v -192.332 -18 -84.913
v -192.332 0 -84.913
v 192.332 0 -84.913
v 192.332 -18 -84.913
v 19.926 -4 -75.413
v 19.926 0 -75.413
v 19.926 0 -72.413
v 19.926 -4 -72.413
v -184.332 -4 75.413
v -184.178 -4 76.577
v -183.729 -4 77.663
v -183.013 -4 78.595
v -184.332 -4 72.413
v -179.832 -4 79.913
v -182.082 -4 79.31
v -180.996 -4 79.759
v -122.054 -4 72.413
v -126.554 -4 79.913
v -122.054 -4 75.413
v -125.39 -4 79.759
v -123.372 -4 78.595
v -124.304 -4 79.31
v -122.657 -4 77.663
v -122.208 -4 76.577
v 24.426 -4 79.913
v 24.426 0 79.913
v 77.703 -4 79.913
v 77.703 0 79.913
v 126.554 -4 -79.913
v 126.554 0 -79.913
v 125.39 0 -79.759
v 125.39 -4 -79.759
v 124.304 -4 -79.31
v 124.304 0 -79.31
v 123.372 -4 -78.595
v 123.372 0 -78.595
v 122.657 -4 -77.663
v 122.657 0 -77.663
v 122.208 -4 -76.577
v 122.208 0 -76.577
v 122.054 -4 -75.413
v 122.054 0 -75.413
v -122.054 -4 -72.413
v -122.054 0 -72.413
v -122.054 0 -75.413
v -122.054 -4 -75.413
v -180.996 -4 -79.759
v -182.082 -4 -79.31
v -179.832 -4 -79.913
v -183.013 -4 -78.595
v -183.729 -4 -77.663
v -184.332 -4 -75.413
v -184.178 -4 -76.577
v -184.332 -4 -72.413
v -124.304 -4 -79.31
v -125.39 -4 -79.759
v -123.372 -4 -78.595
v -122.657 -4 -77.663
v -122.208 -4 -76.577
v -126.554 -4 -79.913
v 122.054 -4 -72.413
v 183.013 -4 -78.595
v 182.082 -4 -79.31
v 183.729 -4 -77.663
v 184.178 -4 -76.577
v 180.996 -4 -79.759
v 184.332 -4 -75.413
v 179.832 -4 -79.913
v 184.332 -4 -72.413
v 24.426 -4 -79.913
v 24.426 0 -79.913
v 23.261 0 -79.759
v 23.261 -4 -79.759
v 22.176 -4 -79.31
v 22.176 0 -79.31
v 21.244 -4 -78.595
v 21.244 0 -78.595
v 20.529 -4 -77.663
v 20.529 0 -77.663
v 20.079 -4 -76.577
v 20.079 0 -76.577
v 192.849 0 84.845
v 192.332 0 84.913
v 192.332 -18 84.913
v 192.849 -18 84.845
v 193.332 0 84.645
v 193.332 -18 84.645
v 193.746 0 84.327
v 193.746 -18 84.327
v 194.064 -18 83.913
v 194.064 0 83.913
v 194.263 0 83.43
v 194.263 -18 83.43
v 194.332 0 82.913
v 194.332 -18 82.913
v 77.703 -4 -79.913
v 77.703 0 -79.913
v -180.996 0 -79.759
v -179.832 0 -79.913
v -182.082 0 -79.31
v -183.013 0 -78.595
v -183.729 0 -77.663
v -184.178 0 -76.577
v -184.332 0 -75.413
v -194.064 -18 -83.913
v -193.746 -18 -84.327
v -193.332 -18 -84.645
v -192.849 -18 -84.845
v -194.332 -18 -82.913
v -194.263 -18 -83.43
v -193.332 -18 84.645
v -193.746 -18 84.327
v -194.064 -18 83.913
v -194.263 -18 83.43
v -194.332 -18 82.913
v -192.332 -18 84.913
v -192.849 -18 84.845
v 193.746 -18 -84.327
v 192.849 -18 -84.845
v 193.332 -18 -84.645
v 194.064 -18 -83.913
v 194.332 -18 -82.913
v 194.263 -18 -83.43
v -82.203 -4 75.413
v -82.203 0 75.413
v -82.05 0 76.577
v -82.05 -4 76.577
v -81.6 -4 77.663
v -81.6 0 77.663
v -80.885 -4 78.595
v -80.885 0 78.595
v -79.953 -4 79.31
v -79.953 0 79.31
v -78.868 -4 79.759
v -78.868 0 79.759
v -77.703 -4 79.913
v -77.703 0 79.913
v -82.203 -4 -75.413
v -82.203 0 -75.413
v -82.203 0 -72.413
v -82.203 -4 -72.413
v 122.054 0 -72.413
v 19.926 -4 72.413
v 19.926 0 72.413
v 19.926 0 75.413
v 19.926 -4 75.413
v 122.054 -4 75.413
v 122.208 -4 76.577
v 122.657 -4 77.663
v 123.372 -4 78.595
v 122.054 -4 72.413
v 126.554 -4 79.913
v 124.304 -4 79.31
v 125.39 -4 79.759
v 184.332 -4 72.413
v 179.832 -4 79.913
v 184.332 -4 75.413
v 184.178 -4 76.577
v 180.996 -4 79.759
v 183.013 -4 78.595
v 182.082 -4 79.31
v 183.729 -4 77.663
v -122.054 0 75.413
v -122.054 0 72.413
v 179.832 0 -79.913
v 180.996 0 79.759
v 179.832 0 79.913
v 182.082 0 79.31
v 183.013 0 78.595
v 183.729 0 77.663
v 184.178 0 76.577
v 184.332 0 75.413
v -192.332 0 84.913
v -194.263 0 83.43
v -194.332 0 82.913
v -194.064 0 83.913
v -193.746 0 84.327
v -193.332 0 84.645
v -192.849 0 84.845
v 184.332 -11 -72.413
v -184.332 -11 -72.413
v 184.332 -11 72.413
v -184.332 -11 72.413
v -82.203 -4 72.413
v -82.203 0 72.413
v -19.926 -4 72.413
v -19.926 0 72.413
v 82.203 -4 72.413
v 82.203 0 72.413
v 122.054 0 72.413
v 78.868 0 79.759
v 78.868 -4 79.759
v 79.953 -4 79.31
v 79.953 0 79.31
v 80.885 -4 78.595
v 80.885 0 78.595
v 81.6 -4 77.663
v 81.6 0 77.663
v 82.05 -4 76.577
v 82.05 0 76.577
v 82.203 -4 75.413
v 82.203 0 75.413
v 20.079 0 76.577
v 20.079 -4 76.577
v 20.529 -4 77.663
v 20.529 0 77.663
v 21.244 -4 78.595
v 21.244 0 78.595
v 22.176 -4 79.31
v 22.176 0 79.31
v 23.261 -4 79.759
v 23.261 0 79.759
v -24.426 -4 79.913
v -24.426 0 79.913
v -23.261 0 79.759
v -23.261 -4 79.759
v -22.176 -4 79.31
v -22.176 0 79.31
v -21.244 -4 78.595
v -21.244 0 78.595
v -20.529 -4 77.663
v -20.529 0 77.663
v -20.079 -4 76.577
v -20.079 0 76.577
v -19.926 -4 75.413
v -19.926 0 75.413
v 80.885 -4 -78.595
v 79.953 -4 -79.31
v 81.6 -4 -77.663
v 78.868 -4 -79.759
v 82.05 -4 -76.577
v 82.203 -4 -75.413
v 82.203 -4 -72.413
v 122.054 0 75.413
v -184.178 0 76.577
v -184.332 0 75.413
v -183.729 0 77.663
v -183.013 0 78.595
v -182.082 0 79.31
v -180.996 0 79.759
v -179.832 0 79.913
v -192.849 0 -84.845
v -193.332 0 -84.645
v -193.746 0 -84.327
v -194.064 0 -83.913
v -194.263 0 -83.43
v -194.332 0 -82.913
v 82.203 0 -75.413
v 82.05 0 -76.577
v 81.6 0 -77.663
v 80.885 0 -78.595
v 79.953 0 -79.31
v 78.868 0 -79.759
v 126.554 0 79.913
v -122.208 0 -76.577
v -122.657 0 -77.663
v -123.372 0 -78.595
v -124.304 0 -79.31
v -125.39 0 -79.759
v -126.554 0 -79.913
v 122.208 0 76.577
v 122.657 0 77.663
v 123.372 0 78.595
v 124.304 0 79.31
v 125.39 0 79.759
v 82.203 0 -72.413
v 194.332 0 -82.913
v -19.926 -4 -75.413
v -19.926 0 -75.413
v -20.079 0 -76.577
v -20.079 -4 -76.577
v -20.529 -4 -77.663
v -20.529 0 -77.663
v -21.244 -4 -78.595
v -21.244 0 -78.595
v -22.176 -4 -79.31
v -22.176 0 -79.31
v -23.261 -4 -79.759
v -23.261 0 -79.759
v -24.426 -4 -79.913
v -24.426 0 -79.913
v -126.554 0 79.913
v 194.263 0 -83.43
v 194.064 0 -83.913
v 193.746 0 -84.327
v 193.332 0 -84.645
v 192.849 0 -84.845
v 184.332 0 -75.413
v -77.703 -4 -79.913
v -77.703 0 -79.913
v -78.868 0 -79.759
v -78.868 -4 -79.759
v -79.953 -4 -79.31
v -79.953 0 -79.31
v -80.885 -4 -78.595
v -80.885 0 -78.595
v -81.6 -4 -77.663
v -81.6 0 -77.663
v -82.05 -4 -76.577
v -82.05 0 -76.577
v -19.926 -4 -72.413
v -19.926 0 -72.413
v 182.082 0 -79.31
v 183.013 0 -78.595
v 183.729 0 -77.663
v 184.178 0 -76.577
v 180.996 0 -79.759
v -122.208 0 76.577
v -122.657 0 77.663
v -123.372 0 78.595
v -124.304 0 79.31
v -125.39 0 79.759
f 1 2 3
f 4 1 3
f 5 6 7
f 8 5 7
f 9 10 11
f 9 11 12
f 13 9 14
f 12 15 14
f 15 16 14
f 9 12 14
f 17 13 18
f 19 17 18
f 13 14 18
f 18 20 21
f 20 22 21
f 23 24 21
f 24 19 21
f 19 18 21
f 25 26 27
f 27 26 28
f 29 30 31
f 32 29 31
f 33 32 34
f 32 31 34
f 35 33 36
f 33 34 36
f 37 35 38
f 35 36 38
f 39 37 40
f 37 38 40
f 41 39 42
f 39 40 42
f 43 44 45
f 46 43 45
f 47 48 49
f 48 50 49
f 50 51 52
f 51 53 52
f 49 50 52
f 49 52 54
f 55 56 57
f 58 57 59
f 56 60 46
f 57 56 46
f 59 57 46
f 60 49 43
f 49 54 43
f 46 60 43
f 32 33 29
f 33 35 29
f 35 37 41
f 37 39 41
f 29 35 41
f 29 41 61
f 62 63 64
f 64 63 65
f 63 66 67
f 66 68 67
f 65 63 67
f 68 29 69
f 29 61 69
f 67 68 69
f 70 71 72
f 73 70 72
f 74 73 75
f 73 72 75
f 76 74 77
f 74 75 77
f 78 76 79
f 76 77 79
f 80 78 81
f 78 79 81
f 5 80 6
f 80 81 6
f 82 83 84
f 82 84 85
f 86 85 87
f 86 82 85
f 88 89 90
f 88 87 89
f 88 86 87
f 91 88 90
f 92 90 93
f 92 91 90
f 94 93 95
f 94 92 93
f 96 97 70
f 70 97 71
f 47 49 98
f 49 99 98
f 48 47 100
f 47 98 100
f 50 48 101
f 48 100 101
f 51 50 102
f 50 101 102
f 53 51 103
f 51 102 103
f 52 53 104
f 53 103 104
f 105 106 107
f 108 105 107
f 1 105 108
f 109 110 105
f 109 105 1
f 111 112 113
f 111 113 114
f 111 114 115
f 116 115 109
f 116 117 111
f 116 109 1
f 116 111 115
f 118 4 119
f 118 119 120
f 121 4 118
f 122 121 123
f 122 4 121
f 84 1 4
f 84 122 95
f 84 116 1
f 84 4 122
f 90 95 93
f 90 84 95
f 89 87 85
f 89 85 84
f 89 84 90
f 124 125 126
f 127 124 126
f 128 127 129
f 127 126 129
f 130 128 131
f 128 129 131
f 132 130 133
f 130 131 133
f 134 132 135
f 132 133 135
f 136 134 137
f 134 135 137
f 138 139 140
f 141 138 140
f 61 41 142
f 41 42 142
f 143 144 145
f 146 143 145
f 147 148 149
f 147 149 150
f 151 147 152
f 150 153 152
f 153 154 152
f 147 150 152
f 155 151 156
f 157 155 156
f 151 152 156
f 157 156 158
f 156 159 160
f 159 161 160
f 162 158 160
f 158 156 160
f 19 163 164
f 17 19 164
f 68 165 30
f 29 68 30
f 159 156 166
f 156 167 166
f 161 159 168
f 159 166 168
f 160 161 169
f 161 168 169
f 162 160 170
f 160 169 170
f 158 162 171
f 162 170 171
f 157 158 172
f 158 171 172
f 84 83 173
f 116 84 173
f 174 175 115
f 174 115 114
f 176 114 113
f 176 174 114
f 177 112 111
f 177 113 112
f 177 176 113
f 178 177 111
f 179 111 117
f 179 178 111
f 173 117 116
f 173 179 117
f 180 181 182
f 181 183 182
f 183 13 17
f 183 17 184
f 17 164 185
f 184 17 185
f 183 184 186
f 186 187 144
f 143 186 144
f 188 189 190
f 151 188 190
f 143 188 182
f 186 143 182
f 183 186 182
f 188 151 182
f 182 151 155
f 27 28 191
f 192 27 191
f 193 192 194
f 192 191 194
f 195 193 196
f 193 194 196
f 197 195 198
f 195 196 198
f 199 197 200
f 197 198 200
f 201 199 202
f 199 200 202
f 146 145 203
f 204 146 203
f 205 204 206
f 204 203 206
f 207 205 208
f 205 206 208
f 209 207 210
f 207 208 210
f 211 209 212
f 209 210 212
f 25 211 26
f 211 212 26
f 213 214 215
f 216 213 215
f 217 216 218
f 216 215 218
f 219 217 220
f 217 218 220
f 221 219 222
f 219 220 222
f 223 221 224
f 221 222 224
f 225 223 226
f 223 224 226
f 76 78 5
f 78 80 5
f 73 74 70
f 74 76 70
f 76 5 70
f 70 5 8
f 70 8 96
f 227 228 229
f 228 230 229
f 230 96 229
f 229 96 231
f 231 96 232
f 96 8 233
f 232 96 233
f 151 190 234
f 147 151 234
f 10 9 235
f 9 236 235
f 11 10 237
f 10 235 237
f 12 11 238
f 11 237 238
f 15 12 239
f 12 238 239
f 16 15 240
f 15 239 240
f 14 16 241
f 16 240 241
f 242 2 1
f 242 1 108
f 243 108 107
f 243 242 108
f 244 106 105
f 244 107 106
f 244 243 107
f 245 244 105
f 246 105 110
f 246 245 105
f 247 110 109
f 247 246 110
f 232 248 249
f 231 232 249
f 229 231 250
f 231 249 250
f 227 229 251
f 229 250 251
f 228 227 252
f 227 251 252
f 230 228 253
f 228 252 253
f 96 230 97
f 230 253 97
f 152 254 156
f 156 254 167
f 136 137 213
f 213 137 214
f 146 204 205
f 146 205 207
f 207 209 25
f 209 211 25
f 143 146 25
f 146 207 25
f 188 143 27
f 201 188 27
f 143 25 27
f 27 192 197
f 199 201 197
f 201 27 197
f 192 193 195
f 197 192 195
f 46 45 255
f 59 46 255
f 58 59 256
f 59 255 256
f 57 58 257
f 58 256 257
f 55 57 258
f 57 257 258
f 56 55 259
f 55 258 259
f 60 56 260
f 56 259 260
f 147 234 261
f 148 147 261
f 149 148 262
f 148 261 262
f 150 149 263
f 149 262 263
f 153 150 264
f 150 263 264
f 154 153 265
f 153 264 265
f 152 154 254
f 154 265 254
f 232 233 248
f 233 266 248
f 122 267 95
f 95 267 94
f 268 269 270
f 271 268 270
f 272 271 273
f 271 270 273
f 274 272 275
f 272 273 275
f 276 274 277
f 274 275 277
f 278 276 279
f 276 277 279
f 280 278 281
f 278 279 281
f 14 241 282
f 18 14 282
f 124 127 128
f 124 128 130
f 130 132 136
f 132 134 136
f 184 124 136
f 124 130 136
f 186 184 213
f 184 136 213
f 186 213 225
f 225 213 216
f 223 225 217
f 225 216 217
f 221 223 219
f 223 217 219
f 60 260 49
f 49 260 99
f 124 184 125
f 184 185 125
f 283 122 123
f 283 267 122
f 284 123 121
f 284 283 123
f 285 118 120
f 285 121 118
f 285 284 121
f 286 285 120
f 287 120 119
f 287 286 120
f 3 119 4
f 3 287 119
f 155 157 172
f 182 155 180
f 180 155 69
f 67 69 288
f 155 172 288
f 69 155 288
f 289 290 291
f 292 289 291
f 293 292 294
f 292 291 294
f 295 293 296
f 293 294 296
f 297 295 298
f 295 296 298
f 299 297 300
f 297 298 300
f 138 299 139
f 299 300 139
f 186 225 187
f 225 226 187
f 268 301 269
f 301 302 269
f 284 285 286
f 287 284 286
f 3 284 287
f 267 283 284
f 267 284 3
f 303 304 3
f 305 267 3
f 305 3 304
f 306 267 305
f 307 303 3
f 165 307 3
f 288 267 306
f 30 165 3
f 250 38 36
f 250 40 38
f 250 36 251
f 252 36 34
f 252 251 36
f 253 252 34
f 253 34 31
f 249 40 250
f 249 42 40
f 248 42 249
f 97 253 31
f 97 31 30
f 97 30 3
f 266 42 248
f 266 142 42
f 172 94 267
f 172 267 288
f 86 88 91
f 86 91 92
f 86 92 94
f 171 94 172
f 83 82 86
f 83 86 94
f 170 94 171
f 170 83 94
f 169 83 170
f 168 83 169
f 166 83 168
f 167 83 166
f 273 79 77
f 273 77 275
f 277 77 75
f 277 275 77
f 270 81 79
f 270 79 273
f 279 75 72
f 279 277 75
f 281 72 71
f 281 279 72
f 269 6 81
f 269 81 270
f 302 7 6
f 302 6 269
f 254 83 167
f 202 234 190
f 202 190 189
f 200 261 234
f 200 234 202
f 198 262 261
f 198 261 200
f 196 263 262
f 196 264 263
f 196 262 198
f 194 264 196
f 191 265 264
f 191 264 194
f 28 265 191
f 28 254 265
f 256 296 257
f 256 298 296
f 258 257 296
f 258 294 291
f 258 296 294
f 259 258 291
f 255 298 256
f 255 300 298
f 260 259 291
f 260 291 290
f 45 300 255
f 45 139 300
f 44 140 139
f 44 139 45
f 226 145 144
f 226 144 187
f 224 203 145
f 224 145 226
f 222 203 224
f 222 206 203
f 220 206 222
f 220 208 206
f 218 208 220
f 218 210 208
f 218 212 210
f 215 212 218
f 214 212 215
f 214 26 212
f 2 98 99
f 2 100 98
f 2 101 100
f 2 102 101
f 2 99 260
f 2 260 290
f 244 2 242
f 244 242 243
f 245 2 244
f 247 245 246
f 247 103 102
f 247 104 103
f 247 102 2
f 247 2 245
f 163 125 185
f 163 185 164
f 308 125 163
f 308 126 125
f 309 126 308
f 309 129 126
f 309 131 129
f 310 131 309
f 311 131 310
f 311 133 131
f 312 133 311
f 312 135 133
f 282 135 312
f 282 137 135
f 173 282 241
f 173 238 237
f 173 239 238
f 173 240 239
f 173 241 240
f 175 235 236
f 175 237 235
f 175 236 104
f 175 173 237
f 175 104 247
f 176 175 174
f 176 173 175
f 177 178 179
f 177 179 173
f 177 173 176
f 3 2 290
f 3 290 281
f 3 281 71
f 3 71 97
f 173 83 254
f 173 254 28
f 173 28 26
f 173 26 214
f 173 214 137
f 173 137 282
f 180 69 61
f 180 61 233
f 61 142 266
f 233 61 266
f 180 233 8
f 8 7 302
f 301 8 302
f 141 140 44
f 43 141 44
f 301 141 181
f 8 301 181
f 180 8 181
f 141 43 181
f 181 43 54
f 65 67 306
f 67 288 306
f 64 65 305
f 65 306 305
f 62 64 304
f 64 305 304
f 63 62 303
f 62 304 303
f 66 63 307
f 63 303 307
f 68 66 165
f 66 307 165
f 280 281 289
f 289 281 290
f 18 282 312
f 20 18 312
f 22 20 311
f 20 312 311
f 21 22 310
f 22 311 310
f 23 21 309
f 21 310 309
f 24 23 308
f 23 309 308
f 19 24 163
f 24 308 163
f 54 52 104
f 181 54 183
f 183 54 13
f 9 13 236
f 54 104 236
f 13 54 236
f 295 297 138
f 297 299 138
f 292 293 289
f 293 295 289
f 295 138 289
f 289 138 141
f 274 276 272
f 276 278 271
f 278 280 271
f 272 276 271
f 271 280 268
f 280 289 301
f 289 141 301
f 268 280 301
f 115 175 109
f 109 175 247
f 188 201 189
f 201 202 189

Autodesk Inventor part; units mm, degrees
ref_plane "YZ Plane" through (0, 0, 0) normal (1, 0, 0) x (0, 1, 0)
ref_plane "XZ Plane" through (0, 0, 0) normal (0, 1, 0) x (-1, 0, 0)
ref_plane "XY Plane" through (0, 0, 0) normal (0, 0, 1) x (1, 0, 0)
sketch "Sketch1" plane through (0, 0, 0) normal (0, 1, 0) x (-1, 0, 0)
  line L0 (183.8315, -67.9127) -> (183.8315, 67.9127) construction
  line L1 (-179.8315, 79.4127) -> (-126.5543, 79.4127) construction
  line L2 (-122.5543, 75.4127) -> (-122.5543, 71.9127) construction
  line L3 (-81.7029, 71.9127) -> (-81.7029, 75.4127) construction
  line L4 (-77.7029, 79.4127) -> (-24.4257, 79.4127) construction
  line L5 (-20.4257, 75.4127) -> (-20.4257, 71.9127) construction
  line L6 (20.4257, 71.9127) -> (20.4257, 75.4127) construction
  line L7 (24.4257, 79.4127) -> (77.7029, 79.4127) construction
  line L8 (81.7029, 75.4127) -> (81.7029, 71.9127) construction
  line L9 (122.5543, 71.9127) -> (122.5543, 75.4127) construction
  line L10 (126.5543, 79.4127) -> (179.8315, 79.4127) construction
  line L11 (183.8315, 75.4127) -> (183.8315, 71.9127) construction
  line L12 (-126.5543, -79.4127) -> (-179.8315, -79.4127) construction
  line L13 (-183.8315, -75.4127) -> (-183.8315, -71.9127) construction
  line L14 (-122.5543, -71.9127) -> (-122.5543, -75.4127) construction
  line L15 (-81.7029, -75.4127) -> (-81.7029, -71.9127) construction
  line L16 (-24.4257, -79.4127) -> (-77.7029, -79.4127) construction
  line L17 (-20.4257, -71.9127) -> (-20.4257, -75.4127) construction
  line L18 (20.4257, -75.4127) -> (20.4257, -71.9127) construction
  line L19 (77.7029, -79.4127) -> (24.4257, -79.4127) construction
  line L20 (81.7029, -71.9127) -> (81.7029, -75.4127) construction
  line L21 (122.5543, -75.4127) -> (122.5543, -71.9127) construction
  line L22 (179.8315, -79.4127) -> (126.5543, -79.4127) construction
  line L23 (183.8315, -71.9127) -> (183.8315, -75.4127) construction
  line L24 (-122.5543, -71.9127) -> (-81.7029, -71.9127) construction
  line L25 (-20.4257, -71.9127) -> (20.4257, -71.9127) construction
  line L26 (81.7029, -71.9127) -> (122.5543, -71.9127) construction
  arc A0 (-183.8315, -75.4127) -> (-179.8315, -79.4127) centre (-179.8315, -75.4127) ccw construction
  arc A1 (-126.5543, -79.4127) -> (-122.5543, -75.4127) centre (-126.5543, -75.4127) ccw construction
  arc A2 (-81.7029, -75.4127) -> (-77.7029, -79.4127) centre (-77.7029, -75.4127) ccw construction
  arc A3 (-24.4257, -79.4127) -> (-20.4257, -75.4127) centre (-24.4257, -75.4127) ccw construction
  arc A4 (20.4257, -75.4127) -> (24.4257, -79.4127) centre (24.4257, -75.4127) ccw construction
  arc A5 (77.7029, -79.4127) -> (81.7029, -75.4127) centre (77.7029, -75.4127) ccw construction
  arc A6 (122.5543, -75.4127) -> (126.5543, -79.4127) centre (126.5543, -75.4127) ccw construction
  arc A7 (179.8315, -79.4127) -> (183.8315, -75.4127) centre (179.8315, -75.4127) ccw construction
  line L27 (183.8315, -67.9127) -> (183.8315, -71.9127) construction
  arc A8 (-179.8315, 79.4127) -> (-183.8315, 75.4127) centre (-179.8315, 75.4127) ccw construction
  arc A9 (-122.5543, 75.4127) -> (-126.5543, 79.4127) centre (-126.5543, 75.4127) ccw construction
  line L28 (-81.7029, 71.9127) -> (-122.5543, 71.9127) construction
  line L29 (20.4257, 71.9127) -> (-20.4257, 71.9127) construction
  line L30 (122.5543, 71.9127) -> (81.7029, 71.9127) construction
  line L31 (183.8315, 71.9127) -> (183.8315, 67.9127) construction
  arc A10 (-77.7029, 79.4127) -> (-81.7029, 75.4127) centre (-77.7029, 75.4127) ccw construction
  arc A11 (-20.4257, 75.4127) -> (-24.4257, 79.4127) centre (-24.4257, 75.4127) ccw construction
  arc A12 (24.4257, 79.4127) -> (20.4257, 75.4127) centre (24.4257, 75.4127) ccw construction
  arc A13 (81.7029, 75.4127) -> (77.7029, 79.4127) centre (77.7029, 75.4127) ccw construction
  arc A14 (126.5543, 79.4127) -> (122.5543, 75.4127) centre (126.5543, 75.4127) ccw construction
  arc A15 (183.8315, 75.4127) -> (179.8315, 79.4127) centre (179.8315, 75.4127) ccw construction
  line L32 (-183.8315, 75.4127) -> (-183.8315, -71.9127) construction
  line L33 (-126.5543, 79.9127) -> (-179.8315, 79.9127)
  arc A16 (-179.8315, 79.9127) -> (-184.3315, 75.4127) centre (-179.8315, 75.4127) ccw
  line L34 (-184.3315, 75.4127) -> (-184.3315, -71.9127)
  line L35 (-184.3315, -71.9127) -> (-184.3315, -75.4127)
  arc A17 (-184.3315, -75.4127) -> (-179.8315, -79.9127) centre (-179.8315, -75.4127) ccw
  line L36 (-179.8315, -79.9127) -> (-126.5543, -79.9127)
  arc A18 (-126.5543, -79.9127) -> (-122.0543, -75.4127) centre (-126.5543, -75.4127) ccw
  line L37 (-122.0543, -75.4127) -> (-122.0543, -72.4127)
  line L38 (-122.0543, -72.4127) -> (-82.2029, -72.4127)
  line L39 (-82.2029, -72.4127) -> (-82.2029, -75.4127)
  arc A19 (-82.2029, -75.4127) -> (-77.7029, -79.9127) centre (-77.7029, -75.4127) ccw
  line L40 (-77.7029, -79.9127) -> (-24.4257, -79.9127)
  arc A20 (-24.4257, -79.9127) -> (-19.9257, -75.4127) centre (-24.4257, -75.4127) ccw
  line L41 (-19.9257, -75.4127) -> (-19.9257, -72.4127)
  line L42 (-19.9257, -72.4127) -> (19.9257, -72.4127)
  line L43 (19.9257, -72.4127) -> (19.9257, -75.4127)
  arc A21 (19.9257, -75.4127) -> (24.4257, -79.9127) centre (24.4257, -75.4127) ccw
  line L44 (24.4257, -79.9127) -> (77.7029, -79.9127)
  arc A22 (77.7029, -79.9127) -> (82.2029, -75.4127) centre (77.7029, -75.4127) ccw
  line L45 (82.2029, -75.4127) -> (82.2029, -72.4127)
  line L46 (82.2029, -72.4127) -> (122.0543, -72.4127)
  line L47 (122.0543, -72.4127) -> (122.0543, -75.4127)
  arc A23 (122.0543, -75.4127) -> (126.5543, -79.9127) centre (126.5543, -75.4127) ccw
  line L48 (126.5543, -79.9127) -> (179.8315, -79.9127)
  arc A24 (179.8315, -79.9127) -> (184.3315, -75.4127) centre (179.8315, -75.4127) ccw
  line L49 (184.3315, -75.4127) -> (184.3315, -71.9127)
  line L50 (184.3315, -71.9127) -> (184.3315, -67.9127)
  line L51 (184.3315, -67.9127) -> (184.3315, 67.9127)
  line L52 (184.3315, 67.9127) -> (184.3315, 71.9127)
  line L53 (184.3315, 71.9127) -> (184.3315, 75.4127)
  arc A25 (184.3315, 75.4127) -> (179.8315, 79.9127) centre (179.8315, 75.4127) ccw
  line L54 (179.8315, 79.9127) -> (126.5543, 79.9127)
  arc A26 (126.5543, 79.9127) -> (122.0543, 75.4127) centre (126.5543, 75.4127) ccw
  line L55 (122.0543, 75.4127) -> (122.0543, 72.4127)
  line L56 (122.0543, 72.4127) -> (82.2029, 72.4127)
  line L57 (82.2029, 72.4127) -> (82.2029, 75.4127)
  arc A27 (82.2029, 75.4127) -> (77.7029, 79.9127) centre (77.7029, 75.4127) ccw
  line L58 (77.7029, 79.9127) -> (24.4257, 79.9127)
  arc A28 (24.4257, 79.9127) -> (19.9257, 75.4127) centre (24.4257, 75.4127) ccw
  line L59 (19.9257, 75.4127) -> (19.9257, 72.4127)
  line L60 (19.9257, 72.4127) -> (-19.9257, 72.4127)
  line L61 (-19.9257, 72.4127) -> (-19.9257, 75.4127)
  arc A29 (-19.9257, 75.4127) -> (-24.4257, 79.9127) centre (-24.4257, 75.4127) ccw
  line L62 (-24.4257, 79.9127) -> (-77.7029, 79.9127)
  arc A30 (-77.7029, 79.9127) -> (-82.2029, 75.4127) centre (-77.7029, 75.4127) ccw
  line L63 (-82.2029, 75.4127) -> (-82.2029, 72.4127)
  line L64 (-82.2029, 72.4127) -> (-122.0543, 72.4127)
  line L65 (-122.0543, 72.4127) -> (-122.0543, 75.4127)
  arc A31 (-122.0543, 75.4127) -> (-126.5543, 79.9127) centre (-126.5543, 75.4127) ccw
  line L66 (-179.8315, 75.4127) -> (179.8315, -75.4127) construction
  line L67 (179.8315, 75.4127) -> (-179.8315, -75.4127) construction
  line L68 (-192.3315, 84.9127) -> (192.3315, 84.9127)
  line L69 (194.3315, 82.9127) -> (194.3315, -82.9127)
  line L70 (192.3315, -84.9127) -> (-192.3315, -84.9127)
  line L71 (-194.3315, -82.9127) -> (-194.3315, 82.9127)
  line L72 (-194.3315, 84.9127) -> (194.3315, -84.9127) construction
  line L73 (194.3315, 84.9127) -> (-194.3315, -84.9127) construction
  arc A32 (-192.3315, 84.9127) -> (-194.3315, 82.9127) centre (-192.3315, 82.9127) ccw
  arc A33 (194.3315, 82.9127) -> (192.3315, 84.9127) centre (192.3315, 82.9127) ccw
  arc A34 (192.3315, -84.9127) -> (194.3315, -82.9127) centre (192.3315, -82.9127) ccw
  arc A35 (-194.3315, -82.9127) -> (-192.3315, -84.9127) centre (-192.3315, -82.9127) ccw
  point P0 (0, 0)
  point P1 (0, 0)
  dimension "d9" = 4
  dimension "d10" = 4
  dimension "d11" = 4
  dimension "d12" = 4
  dimension "d13" = 0.5
  dimension "d16" = 159.8253
  dimension "d17" = 368.6629
  dimension "d18" = 388.6629
  dimension "d19" = 169.8253
  dimension "d20" = 2
extrude "Extrusion1" add sketch "Sketch1" against normal blind 4
sketch "Sketch2" plane through (0, -4, 0) normal (0, -1, 0) x (1, 0, 0)
  line L0 (-192.3315, -84.9127) -> (192.3315, -84.9127) projected
  arc A0 (192.3315, -84.9127) -> (194.3315, -82.9127) centre (192.3315, -82.9127) ccw projected
  line L1 (194.3315, -82.9127) -> (194.3315, 82.9127) projected
  arc A1 (194.3315, 82.9127) -> (192.3315, 84.9127) centre (192.3315, 82.9127) ccw projected
  line L2 (192.3315, 84.9127) -> (-192.3315, 84.9127) projected
  arc A2 (-192.3315, 84.9127) -> (-194.3315, 82.9127) centre (-192.3315, 82.9127) ccw projected
  line L3 (-194.3315, 82.9127) -> (-194.3315, -82.9127) projected
  arc A3 (-194.3315, -82.9127) -> (-192.3315, -84.9127) centre (-192.3315, -82.9127) ccw projected
  arc A4 (126.5543, 79.9127) -> (122.0543, 75.4127) centre (126.5543, 75.4127) ccw projected
  line L4 (126.5543, 79.9127) -> (179.8315, 79.9127) projected
  arc A5 (184.3315, 75.4127) -> (179.8315, 79.9127) centre (179.8315, 75.4127) ccw projected
  line L5 (184.3315, 75.4127) -> (184.3315, -75.4127) projected
  arc A6 (179.8315, -79.9127) -> (184.3315, -75.4127) centre (179.8315, -75.4127) ccw projected
  line L6 (179.8315, -79.9127) -> (126.5543, -79.9127) projected
  arc A7 (122.0543, -75.4127) -> (126.5543, -79.9127) centre (126.5543, -75.4127) ccw projected
  line L7 (122.0543, -75.4127) -> (122.0543, -72.4127) projected
  line L8 (122.0543, -72.4127) -> (82.2029, -72.4127) projected
  line L9 (82.2029, -72.4127) -> (82.2029, -75.4127) projected
  arc A8 (77.7029, -79.9127) -> (82.2029, -75.4127) centre (77.7029, -75.4127) ccw projected
  line L10 (77.7029, -79.9127) -> (24.4257, -79.9127) projected
  arc A9 (19.9257, -75.4127) -> (24.4257, -79.9127) centre (24.4257, -75.4127) ccw projected
  line L11 (19.9257, -75.4127) -> (19.9257, -72.4127) projected
  line L12 (19.9257, -72.4127) -> (-19.9257, -72.4127) projected
  line L13 (-19.9257, -72.4127) -> (-19.9257, -75.4127) projected
  arc A10 (-24.4257, -79.9127) -> (-19.9257, -75.4127) centre (-24.4257, -75.4127) ccw projected
  line L14 (-24.4257, -79.9127) -> (-77.7029, -79.9127) projected
  arc A11 (-82.2029, -75.4127) -> (-77.7029, -79.9127) centre (-77.7029, -75.4127) ccw projected
  line L15 (-82.2029, -75.4127) -> (-82.2029, -72.4127) projected
  line L16 (-82.2029, -72.4127) -> (-122.0543, -72.4127) projected
  line L17 (-122.0543, -72.4127) -> (-122.0543, -75.4127) projected
  arc A12 (-126.5543, -79.9127) -> (-122.0543, -75.4127) centre (-126.5543, -75.4127) ccw projected
  line L18 (-126.5543, -79.9127) -> (-179.8315, -79.9127) projected
  arc A13 (-184.3315, -75.4127) -> (-179.8315, -79.9127) centre (-179.8315, -75.4127) ccw projected
  line L19 (-184.3315, -75.4127) -> (-184.3315, 75.4127) projected
  arc A14 (-179.8315, 79.9127) -> (-184.3315, 75.4127) centre (-179.8315, 75.4127) ccw projected
  line L20 (-179.8315, 79.9127) -> (-126.5543, 79.9127) projected
  arc A15 (-122.0543, 75.4127) -> (-126.5543, 79.9127) centre (-126.5543, 75.4127) ccw projected
  line L21 (-122.0543, 75.4127) -> (-122.0543, 72.4127) projected
  line L22 (-122.0543, 72.4127) -> (-82.2029, 72.4127) projected
  line L23 (-82.2029, 72.4127) -> (-82.2029, 75.4127) projected
  arc A16 (-77.7029, 79.9127) -> (-82.2029, 75.4127) centre (-77.7029, 75.4127) ccw projected
  line L24 (-77.7029, 79.9127) -> (-24.4257, 79.9127) projected
  arc A17 (-19.9257, 75.4127) -> (-24.4257, 79.9127) centre (-24.4257, 75.4127) ccw projected
  line L25 (-19.9257, 75.4127) -> (-19.9257, 72.4127) projected
  line L26 (-19.9257, 72.4127) -> (19.9257, 72.4127) projected
  line L27 (19.9257, 72.4127) -> (19.9257, 75.4127) projected
  arc A18 (24.4257, 79.9127) -> (19.9257, 75.4127) centre (24.4257, 75.4127) ccw projected
  line L28 (24.4257, 79.9127) -> (77.7029, 79.9127) projected
  arc A19 (82.2029, 75.4127) -> (77.7029, 79.9127) centre (77.7029, 75.4127) ccw projected
  line L29 (82.2029, 75.4127) -> (82.2029, 72.4127) projected
  line L30 (82.2029, 72.4127) -> (122.0543, 72.4127) projected
  line L31 (122.0543, 72.4127) -> (122.0543, 75.4127) projected
  line L32 (-184.3315, -75.4127) -> (-184.3315, 75.4127) projected
  line L33 (184.3315, 75.4127) -> (184.3315, -75.4127) projected
  line L34 (-184.3315, 72.4127) -> (184.3315, 72.4127)
  line L35 (184.3315, 72.4127) -> (184.3315, -72.4127)
  line L36 (184.3315, -72.4127) -> (-184.3315, -72.4127)
  line L37 (-184.3315, -72.4127) -> (-184.3315, 72.4127)
  point P0 (0, 0)
extrude "Extrusion2" add sketch "Sketch2" along normal blind 7 contours A3 L3 A2 L2 A1 L1 A0 L0 | L4 A5 L5 L34 L31 A4 | L34 L27 A18 L28 A19 L29 | L5 A6 L6 A7 L7 L36 | L34 L23 A16 L24 A17 L25 | L9 A8 L10 A9 L11 L36 | L34 L19 A14 L20 A15 L21 | L13 A10 L14 A11 L15 L36 | L36 L17 A12 L18 A13 L19
sketch "Sketch3" plane through (0, -11, 0) normal (0, -1, 0) x (1, 0, 0)
  arc A0 (192.3315, -84.9127) -> (194.3315, -82.9127) centre (192.3315, -82.9127) ccw projected
  line L0 (194.3315, -82.9127) -> (194.3315, 82.9127) projected
  arc A1 (194.3315, 82.9127) -> (192.3315, 84.9127) centre (192.3315, 82.9127) ccw projected
  line L1 (192.3315, 84.9127) -> (-192.3315, 84.9127) projected
  arc A2 (-192.3315, 84.9127) -> (-194.3315, 82.9127) centre (-192.3315, 82.9127) ccw projected
  line L2 (-194.3315, 82.9127) -> (-194.3315, -82.9127) projected
  arc A3 (-194.3315, -82.9127) -> (-192.3315, -84.9127) centre (-192.3315, -82.9127) ccw projected
  line L3 (-192.3315, -84.9127) -> (192.3315, -84.9127) projected
  line L4 (184.3315, 72.4127) -> (184.3315, -72.4127) projected
  line L5 (184.3315, -72.4127) -> (-184.3315, -72.4127) projected
  line L6 (-184.3315, -72.4127) -> (-184.3315, 72.4127) projected
  line L7 (-184.3315, 72.4127) -> (184.3315, 72.4127) projected
  point P0 (0, 0)
extrude "Extrusion3" add sketch "Sketch3" along normal blind 7 contours L3 A3 L2 A2 L1 A1 L0 A0 | L4 L5 L6 L7
properties part number "kbbottombodyethan"
